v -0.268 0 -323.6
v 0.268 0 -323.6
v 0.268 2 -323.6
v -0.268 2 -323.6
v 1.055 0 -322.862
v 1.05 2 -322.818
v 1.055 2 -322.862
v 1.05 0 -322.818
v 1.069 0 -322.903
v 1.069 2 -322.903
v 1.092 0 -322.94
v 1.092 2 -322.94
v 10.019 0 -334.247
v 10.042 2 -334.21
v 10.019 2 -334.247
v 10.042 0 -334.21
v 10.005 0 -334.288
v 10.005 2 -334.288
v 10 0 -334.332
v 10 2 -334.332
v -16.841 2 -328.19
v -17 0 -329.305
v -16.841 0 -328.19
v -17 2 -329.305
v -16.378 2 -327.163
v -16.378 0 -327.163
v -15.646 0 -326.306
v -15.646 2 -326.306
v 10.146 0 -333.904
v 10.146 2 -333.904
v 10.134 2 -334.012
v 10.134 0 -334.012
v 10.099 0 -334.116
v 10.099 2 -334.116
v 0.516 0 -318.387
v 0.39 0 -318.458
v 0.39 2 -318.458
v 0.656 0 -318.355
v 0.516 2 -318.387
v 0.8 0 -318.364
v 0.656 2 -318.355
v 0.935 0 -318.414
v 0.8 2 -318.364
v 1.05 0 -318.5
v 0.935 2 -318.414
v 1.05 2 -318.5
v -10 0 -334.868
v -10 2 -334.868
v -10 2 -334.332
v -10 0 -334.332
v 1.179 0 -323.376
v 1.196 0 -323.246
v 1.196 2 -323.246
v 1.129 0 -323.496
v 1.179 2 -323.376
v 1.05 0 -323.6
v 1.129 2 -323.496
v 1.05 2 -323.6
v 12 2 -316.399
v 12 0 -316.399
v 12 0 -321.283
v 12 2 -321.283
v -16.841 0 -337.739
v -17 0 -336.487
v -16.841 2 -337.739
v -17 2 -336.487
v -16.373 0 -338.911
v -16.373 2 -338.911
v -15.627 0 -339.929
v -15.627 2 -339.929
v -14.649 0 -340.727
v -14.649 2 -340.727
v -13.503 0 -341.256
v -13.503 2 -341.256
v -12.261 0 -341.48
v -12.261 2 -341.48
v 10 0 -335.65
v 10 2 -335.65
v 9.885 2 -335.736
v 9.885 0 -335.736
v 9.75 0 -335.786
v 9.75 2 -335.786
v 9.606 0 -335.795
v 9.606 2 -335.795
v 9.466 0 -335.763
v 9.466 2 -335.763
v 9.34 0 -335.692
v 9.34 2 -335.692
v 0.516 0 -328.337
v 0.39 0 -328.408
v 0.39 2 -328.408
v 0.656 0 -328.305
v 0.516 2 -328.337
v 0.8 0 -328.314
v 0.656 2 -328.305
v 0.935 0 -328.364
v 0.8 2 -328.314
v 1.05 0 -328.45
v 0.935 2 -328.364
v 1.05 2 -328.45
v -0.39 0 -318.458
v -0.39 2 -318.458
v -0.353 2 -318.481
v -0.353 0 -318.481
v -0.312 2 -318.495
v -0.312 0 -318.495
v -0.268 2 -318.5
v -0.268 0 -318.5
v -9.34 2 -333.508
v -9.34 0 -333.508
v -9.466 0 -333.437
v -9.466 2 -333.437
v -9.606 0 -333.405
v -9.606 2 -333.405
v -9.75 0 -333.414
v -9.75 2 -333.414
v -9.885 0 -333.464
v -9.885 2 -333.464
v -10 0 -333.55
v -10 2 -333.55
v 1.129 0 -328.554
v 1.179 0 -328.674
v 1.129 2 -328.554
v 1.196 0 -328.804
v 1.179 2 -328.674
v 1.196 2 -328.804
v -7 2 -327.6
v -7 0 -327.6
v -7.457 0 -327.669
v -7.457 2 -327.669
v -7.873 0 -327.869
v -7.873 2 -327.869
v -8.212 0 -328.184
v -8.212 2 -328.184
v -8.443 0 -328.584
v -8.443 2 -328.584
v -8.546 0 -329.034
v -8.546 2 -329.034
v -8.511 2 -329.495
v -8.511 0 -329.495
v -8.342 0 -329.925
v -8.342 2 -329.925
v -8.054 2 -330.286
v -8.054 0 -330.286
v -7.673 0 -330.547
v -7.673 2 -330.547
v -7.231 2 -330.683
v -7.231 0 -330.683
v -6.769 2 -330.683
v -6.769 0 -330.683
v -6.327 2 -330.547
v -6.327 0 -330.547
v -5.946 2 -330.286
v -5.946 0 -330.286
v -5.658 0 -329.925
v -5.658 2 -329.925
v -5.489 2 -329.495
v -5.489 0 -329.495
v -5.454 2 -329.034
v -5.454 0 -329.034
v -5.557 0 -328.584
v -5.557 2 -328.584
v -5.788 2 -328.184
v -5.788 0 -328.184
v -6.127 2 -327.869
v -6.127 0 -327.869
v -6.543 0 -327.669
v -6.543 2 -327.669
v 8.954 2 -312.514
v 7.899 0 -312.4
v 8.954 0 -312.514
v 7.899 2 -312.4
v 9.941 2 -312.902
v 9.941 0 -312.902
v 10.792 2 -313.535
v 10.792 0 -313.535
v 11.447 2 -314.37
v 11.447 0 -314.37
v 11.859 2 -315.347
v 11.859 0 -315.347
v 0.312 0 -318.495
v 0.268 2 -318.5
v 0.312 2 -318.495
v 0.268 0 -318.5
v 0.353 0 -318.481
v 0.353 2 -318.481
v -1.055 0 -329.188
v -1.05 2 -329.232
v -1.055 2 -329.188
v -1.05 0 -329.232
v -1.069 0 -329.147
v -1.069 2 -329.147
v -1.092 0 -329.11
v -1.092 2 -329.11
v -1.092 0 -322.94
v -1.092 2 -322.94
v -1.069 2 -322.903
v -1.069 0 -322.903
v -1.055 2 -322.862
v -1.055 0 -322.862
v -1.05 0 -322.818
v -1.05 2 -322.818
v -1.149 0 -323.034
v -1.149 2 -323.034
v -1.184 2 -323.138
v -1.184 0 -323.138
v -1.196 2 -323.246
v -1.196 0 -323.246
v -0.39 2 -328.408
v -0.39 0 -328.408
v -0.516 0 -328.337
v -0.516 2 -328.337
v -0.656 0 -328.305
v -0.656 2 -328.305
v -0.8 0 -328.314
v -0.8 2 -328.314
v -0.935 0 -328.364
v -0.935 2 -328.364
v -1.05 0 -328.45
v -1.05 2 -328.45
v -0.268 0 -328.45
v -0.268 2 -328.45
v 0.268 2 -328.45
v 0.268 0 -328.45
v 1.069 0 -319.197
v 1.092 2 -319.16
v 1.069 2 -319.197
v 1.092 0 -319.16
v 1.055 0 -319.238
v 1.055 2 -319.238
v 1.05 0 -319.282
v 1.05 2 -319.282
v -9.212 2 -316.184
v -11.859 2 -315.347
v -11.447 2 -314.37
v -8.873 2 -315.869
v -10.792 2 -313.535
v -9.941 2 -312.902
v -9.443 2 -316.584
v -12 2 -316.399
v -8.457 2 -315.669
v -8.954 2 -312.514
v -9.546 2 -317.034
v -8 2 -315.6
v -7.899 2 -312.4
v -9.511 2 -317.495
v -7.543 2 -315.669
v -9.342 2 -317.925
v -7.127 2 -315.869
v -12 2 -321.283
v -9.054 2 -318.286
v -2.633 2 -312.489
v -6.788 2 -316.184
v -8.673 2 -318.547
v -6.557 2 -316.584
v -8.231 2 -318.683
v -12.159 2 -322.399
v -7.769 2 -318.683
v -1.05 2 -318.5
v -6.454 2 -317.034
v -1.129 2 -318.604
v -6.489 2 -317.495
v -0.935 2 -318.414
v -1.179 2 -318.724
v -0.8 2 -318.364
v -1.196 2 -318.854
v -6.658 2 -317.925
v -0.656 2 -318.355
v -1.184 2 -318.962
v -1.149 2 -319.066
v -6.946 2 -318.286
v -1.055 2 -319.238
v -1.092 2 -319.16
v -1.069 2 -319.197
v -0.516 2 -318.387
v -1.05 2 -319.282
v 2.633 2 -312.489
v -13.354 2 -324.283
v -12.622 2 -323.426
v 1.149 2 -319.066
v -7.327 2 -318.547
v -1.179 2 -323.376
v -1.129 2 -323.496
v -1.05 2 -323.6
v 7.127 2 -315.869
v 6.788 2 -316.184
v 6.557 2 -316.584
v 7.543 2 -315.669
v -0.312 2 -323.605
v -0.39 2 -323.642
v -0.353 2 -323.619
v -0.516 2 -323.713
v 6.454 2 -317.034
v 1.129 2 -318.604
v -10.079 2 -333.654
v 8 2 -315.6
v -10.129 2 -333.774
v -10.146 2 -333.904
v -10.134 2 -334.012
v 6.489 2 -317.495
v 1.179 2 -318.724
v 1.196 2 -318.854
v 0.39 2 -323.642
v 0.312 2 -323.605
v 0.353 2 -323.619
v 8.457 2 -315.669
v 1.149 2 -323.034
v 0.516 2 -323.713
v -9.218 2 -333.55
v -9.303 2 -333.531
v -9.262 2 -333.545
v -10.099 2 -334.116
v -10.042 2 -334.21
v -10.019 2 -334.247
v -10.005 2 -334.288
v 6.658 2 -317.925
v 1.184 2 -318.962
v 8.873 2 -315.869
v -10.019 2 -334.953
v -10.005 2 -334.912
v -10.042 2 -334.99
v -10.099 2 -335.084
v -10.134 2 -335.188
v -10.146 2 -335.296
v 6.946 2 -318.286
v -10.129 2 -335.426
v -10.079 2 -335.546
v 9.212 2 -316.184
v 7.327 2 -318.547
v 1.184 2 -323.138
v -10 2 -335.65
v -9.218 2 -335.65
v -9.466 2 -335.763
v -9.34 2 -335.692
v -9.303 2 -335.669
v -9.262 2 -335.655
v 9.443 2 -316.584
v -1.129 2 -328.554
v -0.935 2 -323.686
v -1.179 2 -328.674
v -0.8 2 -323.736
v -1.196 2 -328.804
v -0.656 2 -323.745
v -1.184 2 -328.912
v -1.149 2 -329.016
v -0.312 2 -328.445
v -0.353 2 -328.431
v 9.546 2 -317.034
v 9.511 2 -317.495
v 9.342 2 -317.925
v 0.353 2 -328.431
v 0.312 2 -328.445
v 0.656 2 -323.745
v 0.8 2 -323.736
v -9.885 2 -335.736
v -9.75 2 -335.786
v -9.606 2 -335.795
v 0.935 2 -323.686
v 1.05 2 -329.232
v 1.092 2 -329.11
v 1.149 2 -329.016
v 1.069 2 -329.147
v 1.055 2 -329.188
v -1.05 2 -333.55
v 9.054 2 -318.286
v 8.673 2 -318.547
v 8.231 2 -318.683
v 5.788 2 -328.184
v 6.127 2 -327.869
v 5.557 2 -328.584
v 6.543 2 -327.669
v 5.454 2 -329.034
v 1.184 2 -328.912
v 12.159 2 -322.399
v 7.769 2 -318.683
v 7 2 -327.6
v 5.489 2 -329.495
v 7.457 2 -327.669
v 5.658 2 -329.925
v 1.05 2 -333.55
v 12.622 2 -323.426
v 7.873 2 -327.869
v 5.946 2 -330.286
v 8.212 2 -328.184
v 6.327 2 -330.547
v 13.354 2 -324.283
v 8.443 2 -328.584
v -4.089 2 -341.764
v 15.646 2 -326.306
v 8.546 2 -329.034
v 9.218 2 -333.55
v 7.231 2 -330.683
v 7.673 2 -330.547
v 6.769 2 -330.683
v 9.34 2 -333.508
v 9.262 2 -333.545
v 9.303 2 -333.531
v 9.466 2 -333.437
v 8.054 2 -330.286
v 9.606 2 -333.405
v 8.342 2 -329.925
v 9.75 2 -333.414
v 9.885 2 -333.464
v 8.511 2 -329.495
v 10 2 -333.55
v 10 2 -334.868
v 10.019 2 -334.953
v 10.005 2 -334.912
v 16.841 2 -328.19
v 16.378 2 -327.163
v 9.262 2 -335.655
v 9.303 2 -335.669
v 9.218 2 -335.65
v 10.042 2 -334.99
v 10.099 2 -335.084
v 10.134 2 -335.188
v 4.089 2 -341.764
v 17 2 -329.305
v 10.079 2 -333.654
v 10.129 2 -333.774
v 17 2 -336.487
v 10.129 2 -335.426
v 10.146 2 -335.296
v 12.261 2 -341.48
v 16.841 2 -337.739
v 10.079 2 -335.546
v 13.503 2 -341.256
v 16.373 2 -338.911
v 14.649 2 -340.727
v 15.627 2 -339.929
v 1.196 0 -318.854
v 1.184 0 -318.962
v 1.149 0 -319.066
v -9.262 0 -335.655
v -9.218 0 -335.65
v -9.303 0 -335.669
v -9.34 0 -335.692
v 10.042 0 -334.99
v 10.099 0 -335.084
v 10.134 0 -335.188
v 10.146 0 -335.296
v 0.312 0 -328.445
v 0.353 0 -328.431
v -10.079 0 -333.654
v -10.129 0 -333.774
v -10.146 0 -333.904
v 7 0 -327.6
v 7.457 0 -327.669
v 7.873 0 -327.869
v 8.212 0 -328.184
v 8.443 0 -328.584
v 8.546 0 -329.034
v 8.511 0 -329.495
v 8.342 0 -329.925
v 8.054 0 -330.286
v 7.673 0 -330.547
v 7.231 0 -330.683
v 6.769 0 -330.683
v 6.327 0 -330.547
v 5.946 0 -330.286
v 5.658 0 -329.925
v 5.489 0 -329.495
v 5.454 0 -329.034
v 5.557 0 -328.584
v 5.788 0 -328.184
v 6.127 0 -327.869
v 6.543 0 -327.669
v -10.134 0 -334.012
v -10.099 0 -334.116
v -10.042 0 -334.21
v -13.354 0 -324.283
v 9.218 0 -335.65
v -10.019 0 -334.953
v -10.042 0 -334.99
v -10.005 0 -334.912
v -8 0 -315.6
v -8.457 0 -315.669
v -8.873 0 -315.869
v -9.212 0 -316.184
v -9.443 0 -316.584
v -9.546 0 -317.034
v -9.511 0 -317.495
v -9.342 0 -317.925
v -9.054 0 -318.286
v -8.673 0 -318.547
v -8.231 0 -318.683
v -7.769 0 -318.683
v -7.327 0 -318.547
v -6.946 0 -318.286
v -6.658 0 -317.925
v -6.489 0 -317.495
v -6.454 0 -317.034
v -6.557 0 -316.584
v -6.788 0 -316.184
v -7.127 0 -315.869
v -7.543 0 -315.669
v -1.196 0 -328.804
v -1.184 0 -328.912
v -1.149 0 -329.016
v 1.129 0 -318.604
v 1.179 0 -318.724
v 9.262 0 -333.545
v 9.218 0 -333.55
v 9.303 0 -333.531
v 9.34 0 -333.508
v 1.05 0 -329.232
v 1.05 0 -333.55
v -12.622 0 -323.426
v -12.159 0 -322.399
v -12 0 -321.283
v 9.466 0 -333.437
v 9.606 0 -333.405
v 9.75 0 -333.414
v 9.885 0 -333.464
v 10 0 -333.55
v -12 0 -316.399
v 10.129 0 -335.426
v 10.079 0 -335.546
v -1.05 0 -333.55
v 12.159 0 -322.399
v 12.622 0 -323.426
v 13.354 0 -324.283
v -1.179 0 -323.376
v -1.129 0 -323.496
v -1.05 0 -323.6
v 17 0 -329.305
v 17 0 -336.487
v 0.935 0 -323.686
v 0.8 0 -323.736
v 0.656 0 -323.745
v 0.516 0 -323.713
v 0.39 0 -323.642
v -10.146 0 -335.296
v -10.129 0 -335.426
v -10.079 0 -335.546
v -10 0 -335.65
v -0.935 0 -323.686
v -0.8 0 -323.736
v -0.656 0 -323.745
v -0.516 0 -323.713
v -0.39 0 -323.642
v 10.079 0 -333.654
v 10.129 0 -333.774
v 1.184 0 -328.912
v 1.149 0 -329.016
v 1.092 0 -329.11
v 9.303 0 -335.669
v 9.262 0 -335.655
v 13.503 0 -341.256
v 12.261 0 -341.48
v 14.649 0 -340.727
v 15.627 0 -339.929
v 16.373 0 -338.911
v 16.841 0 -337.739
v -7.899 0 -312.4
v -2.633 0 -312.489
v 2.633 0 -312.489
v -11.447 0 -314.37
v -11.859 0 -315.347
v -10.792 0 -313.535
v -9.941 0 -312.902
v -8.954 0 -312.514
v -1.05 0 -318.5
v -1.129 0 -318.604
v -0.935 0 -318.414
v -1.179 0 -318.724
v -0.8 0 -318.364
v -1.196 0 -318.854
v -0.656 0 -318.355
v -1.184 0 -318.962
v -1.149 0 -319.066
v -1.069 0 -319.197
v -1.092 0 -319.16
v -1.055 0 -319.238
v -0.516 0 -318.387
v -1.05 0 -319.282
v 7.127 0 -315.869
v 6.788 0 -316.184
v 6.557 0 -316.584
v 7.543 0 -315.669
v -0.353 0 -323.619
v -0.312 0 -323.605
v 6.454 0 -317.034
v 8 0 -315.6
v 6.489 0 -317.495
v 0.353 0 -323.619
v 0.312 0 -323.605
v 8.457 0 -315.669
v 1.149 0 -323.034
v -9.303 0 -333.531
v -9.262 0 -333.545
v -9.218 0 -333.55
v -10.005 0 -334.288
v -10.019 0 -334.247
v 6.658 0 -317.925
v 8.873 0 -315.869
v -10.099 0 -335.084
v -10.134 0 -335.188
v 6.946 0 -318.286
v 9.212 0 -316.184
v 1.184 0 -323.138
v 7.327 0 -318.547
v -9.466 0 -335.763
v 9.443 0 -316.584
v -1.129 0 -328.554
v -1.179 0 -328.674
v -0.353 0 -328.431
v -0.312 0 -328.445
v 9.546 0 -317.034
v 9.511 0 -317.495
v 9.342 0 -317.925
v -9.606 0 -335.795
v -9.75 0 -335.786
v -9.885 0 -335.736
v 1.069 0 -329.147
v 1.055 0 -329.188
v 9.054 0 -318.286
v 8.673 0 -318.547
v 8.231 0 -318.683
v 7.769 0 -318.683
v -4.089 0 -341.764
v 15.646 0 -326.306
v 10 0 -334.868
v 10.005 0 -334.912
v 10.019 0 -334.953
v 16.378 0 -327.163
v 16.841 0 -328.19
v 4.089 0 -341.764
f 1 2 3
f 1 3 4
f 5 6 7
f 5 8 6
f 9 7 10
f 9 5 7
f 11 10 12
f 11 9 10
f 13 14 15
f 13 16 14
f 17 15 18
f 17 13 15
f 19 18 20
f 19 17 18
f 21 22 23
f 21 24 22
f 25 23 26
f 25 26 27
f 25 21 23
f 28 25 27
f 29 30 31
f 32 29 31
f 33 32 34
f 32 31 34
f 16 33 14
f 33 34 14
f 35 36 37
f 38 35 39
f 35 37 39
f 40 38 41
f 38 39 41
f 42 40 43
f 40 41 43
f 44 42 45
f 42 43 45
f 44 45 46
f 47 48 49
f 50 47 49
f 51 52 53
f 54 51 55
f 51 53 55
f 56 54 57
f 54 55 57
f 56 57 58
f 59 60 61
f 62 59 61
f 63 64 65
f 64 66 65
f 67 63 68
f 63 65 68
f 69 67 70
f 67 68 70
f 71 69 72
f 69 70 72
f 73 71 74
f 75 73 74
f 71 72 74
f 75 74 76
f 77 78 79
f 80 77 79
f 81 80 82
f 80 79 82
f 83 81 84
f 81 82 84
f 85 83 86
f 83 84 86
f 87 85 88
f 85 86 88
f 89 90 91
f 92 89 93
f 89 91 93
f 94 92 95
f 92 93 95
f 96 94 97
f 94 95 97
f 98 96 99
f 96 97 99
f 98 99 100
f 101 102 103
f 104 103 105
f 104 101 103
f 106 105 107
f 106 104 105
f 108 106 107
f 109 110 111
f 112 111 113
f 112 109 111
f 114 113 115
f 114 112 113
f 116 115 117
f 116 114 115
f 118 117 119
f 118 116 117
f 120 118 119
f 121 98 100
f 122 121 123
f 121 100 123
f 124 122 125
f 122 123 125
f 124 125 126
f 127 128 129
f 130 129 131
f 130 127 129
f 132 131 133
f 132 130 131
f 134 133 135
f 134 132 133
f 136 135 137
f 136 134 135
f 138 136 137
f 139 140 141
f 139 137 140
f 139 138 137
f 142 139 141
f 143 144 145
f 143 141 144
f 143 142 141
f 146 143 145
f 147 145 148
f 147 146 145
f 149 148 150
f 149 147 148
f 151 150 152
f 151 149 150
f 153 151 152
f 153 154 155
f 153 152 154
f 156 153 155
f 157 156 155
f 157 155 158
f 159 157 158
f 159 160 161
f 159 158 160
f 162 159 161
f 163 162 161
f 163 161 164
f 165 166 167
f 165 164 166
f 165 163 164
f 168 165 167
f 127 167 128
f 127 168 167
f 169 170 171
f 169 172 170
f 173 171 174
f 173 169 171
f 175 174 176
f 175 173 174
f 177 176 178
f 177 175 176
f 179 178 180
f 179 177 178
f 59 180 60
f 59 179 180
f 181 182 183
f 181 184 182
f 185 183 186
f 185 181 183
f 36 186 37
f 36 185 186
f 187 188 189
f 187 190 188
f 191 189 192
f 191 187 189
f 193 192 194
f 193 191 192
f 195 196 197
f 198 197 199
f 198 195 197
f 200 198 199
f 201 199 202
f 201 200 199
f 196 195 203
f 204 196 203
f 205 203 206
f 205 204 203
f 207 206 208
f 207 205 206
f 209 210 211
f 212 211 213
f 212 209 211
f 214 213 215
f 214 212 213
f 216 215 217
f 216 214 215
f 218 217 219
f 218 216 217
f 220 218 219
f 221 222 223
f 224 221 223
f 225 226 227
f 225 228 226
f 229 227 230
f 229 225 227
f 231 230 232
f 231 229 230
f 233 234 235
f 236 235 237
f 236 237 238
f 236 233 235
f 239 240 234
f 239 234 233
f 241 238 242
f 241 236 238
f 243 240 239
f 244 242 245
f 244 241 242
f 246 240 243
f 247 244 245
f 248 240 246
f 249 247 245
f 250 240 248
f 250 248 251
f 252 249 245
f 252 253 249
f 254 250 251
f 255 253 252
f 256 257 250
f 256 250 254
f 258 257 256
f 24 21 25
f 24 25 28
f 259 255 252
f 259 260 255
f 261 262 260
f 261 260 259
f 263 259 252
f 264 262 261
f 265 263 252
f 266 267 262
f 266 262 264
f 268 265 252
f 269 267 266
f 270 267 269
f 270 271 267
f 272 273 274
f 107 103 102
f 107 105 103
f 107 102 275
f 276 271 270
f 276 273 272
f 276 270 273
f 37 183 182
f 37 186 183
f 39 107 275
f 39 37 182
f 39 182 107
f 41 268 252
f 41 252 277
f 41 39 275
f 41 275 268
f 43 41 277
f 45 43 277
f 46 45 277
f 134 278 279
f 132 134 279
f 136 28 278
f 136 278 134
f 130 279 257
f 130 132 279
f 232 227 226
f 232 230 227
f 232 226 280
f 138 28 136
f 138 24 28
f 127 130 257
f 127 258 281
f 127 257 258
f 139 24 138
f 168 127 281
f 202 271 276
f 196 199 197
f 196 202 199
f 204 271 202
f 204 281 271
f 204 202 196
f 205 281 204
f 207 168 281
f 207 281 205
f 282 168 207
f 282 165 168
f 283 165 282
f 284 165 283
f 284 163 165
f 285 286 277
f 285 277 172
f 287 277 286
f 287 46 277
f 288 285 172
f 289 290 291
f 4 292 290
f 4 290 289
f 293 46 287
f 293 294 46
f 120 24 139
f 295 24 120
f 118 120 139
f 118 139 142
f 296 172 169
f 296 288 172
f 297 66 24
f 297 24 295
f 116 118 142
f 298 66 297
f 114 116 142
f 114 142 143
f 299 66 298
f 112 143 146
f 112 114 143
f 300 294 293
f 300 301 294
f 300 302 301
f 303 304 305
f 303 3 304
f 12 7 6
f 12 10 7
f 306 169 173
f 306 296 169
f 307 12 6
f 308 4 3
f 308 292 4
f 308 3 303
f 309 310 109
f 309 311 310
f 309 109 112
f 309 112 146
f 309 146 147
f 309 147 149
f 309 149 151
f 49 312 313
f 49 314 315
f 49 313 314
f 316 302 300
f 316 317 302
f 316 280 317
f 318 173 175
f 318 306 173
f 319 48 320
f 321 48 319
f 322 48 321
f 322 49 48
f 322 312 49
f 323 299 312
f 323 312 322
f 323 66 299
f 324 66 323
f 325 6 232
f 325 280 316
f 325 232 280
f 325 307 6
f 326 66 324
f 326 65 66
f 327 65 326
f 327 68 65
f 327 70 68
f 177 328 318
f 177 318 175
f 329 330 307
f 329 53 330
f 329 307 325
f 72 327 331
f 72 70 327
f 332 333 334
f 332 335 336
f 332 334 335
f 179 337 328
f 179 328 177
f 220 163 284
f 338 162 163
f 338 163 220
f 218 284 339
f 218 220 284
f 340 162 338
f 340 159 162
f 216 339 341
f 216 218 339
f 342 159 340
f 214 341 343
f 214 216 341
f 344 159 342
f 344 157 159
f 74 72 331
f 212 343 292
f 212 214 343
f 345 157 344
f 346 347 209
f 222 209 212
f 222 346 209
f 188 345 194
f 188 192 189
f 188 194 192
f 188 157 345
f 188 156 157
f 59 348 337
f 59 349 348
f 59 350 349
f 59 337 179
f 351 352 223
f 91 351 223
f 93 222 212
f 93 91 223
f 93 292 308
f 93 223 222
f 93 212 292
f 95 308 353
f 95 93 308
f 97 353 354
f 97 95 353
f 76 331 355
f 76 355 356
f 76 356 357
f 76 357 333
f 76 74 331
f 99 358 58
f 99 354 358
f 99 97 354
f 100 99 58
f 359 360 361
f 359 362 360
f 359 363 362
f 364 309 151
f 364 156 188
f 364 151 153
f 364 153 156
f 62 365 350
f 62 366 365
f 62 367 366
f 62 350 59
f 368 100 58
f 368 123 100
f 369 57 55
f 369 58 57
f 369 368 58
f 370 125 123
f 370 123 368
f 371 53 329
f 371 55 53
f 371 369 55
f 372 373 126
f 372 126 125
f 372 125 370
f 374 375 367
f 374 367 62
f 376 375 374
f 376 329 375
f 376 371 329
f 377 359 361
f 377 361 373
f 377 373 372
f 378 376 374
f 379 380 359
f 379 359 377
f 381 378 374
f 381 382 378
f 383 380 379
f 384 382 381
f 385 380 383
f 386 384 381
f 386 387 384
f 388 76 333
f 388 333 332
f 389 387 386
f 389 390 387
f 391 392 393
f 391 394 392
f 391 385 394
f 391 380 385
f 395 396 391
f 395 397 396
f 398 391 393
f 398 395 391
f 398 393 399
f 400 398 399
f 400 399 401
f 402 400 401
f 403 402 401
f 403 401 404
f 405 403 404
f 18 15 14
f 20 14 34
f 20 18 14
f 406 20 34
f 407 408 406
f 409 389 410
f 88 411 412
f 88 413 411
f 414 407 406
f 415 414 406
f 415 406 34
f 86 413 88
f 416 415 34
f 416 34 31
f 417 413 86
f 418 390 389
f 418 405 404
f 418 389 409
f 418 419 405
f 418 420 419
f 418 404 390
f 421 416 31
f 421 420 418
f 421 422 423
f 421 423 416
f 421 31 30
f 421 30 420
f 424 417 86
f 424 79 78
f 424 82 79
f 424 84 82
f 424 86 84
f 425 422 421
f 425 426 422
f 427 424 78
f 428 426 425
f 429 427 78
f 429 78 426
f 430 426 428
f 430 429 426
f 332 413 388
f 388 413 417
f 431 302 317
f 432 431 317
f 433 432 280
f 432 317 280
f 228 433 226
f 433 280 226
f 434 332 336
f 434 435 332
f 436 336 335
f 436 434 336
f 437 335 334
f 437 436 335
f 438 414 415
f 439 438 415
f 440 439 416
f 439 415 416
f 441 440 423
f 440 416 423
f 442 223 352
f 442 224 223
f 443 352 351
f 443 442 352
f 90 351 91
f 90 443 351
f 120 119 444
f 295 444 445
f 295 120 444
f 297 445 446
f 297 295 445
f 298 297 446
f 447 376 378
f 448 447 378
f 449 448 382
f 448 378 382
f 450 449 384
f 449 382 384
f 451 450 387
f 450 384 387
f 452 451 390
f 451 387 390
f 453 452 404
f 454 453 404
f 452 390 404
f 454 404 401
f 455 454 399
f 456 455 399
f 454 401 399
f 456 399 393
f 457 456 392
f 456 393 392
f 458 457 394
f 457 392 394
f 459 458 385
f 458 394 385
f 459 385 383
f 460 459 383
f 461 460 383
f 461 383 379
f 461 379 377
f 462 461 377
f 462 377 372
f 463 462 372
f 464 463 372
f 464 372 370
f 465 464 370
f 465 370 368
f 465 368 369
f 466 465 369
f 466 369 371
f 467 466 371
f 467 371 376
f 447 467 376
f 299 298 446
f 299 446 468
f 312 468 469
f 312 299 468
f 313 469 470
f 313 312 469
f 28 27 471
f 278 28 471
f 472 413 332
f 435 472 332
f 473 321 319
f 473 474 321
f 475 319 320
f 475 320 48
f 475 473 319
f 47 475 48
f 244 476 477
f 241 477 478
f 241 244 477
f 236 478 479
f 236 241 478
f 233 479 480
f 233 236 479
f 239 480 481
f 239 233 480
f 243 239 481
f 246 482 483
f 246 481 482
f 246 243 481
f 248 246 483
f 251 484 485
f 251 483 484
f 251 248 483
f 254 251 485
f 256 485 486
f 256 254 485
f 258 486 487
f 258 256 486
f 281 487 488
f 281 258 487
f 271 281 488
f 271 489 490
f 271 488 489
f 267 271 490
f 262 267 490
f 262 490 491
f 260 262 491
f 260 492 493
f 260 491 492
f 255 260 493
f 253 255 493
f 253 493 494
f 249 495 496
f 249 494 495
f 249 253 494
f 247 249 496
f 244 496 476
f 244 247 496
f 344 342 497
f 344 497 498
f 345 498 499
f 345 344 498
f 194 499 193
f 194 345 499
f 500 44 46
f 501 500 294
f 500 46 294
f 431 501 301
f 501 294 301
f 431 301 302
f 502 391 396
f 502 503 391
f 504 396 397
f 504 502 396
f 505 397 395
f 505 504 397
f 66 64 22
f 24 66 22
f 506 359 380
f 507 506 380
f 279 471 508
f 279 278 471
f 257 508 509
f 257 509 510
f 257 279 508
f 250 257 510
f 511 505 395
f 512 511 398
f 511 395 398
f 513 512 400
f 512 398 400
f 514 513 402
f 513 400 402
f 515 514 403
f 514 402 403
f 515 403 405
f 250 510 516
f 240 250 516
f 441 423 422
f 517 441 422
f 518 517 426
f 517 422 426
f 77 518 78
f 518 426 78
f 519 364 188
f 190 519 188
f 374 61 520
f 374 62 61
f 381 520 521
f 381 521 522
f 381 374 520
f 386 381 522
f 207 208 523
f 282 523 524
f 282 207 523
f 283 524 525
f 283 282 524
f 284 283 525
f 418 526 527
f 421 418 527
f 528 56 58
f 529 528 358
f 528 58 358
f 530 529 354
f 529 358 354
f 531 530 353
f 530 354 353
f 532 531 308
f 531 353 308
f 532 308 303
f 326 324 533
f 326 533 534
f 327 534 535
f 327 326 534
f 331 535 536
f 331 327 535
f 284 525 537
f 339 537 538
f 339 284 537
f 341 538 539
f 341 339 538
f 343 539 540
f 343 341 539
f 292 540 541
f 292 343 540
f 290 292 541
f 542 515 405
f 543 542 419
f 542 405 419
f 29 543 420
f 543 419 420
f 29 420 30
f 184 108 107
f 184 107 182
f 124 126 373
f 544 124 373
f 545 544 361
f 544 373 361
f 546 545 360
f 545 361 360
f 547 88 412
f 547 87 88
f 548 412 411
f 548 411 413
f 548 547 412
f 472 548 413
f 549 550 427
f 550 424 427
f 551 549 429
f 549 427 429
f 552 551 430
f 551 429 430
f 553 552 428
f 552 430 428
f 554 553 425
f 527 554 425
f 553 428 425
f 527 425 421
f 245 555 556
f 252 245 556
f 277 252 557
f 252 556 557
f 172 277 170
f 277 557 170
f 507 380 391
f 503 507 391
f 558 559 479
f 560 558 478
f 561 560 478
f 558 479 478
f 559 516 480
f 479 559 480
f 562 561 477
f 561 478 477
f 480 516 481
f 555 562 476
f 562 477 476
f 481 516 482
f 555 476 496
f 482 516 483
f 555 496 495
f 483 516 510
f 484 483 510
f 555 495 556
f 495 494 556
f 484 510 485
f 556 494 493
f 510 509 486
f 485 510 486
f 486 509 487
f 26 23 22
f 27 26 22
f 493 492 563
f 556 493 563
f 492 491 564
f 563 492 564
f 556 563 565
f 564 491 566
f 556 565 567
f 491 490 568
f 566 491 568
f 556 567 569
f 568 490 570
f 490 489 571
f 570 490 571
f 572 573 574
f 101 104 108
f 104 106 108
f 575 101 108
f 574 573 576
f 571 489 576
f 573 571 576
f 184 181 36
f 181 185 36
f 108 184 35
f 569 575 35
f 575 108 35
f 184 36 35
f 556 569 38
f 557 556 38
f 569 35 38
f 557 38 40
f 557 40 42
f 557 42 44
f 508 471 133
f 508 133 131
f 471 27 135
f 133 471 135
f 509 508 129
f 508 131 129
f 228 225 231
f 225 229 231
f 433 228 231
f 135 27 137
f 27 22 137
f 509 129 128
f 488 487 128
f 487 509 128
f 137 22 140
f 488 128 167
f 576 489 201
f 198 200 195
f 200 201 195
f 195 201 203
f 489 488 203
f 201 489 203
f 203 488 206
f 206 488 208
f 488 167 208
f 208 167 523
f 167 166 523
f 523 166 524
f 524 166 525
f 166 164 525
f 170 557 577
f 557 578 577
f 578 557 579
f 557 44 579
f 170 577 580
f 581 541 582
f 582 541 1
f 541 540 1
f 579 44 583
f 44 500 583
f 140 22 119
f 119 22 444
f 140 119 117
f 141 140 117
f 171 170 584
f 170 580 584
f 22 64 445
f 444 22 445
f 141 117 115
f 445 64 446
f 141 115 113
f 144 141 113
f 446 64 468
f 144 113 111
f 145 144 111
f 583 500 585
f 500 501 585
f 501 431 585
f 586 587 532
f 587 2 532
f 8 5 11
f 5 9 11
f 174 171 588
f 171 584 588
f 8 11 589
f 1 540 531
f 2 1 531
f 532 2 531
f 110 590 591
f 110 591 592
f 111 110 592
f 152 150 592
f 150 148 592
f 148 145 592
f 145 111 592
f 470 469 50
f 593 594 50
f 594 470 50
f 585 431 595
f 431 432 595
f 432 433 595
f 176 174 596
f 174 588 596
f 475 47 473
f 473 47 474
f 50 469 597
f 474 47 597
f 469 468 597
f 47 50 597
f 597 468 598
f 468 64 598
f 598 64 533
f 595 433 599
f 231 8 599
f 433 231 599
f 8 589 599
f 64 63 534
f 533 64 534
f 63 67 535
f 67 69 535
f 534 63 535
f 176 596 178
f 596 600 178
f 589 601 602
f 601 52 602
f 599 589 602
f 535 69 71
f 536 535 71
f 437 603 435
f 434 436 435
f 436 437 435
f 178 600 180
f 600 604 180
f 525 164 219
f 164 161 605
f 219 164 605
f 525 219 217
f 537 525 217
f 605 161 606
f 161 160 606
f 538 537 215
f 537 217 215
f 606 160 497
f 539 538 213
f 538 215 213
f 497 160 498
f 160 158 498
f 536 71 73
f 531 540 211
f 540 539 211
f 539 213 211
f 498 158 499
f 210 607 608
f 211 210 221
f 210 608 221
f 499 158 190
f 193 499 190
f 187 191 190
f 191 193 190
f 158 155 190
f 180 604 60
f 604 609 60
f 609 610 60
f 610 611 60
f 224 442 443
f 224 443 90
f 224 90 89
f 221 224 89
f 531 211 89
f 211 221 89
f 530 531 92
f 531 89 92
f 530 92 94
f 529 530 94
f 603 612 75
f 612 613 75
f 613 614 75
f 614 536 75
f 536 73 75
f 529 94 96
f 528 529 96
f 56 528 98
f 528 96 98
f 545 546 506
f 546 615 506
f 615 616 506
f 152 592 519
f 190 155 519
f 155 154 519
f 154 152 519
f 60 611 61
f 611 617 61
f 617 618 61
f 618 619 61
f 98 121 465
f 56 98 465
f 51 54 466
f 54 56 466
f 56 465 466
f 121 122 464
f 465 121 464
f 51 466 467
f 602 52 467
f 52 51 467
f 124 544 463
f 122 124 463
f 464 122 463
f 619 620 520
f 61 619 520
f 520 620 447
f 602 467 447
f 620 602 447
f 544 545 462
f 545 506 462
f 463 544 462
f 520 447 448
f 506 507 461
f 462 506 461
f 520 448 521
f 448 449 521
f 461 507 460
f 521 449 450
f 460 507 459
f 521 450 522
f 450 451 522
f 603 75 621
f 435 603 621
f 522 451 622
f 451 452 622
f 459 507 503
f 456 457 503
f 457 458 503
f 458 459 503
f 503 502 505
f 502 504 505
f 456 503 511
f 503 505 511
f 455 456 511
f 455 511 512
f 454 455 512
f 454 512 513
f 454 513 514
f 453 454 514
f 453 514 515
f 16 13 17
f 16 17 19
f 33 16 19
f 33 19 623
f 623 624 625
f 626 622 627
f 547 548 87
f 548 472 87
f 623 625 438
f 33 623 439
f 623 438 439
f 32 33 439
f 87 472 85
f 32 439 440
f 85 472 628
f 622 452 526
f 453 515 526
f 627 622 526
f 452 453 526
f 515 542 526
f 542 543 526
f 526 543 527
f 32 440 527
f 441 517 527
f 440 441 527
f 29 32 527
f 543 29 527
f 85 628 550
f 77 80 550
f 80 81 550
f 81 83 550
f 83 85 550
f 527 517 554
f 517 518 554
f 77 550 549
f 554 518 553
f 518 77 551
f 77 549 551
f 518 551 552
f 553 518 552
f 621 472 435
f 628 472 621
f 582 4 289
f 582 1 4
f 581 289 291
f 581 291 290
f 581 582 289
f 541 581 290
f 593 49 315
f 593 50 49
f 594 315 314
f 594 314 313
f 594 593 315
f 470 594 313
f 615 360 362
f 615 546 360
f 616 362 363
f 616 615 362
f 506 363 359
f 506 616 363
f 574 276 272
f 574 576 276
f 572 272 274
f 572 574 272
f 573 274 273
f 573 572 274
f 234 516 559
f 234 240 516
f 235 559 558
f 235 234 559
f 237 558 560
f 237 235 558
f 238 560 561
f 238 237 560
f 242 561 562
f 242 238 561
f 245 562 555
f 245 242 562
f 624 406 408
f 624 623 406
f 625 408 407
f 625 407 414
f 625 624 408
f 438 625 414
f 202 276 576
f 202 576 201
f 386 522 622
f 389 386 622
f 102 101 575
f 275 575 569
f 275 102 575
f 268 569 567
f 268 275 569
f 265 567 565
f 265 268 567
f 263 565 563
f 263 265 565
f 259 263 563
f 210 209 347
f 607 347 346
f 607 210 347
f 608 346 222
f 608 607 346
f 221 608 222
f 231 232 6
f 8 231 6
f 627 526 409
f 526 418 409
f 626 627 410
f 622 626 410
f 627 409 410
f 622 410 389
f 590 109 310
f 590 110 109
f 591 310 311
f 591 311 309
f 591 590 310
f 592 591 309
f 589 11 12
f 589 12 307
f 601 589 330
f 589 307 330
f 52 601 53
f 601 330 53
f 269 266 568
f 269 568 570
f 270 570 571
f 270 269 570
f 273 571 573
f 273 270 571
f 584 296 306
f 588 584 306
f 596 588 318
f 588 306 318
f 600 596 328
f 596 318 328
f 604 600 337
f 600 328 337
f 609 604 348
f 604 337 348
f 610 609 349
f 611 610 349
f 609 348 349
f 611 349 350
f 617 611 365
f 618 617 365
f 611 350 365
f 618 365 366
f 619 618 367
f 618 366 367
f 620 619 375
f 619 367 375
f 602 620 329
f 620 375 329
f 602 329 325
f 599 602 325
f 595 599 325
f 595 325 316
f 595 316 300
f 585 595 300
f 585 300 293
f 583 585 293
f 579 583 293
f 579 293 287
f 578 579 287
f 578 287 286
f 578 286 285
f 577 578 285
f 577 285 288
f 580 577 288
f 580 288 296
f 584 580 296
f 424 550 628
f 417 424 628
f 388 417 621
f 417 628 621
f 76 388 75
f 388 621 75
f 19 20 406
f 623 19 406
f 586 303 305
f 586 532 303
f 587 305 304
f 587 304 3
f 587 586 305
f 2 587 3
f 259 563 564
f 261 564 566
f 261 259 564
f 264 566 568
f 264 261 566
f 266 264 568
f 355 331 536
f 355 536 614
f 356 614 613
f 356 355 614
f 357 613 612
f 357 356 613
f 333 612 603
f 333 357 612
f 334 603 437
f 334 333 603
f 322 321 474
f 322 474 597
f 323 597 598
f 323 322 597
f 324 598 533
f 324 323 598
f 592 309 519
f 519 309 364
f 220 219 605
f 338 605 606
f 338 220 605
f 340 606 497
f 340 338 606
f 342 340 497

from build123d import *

# Parameters (mm, degrees)
EXTRUDE_1_DEPTH     = 2
SKETCH_2_W          = 1.05
SKETCH_2_H          = 5.1
CUT_EXTRUDE_1_DEPTH = 343.228344823
CUT_EXTRUDE_2_DEPTH = 343.228344823
FILLET_1_R          = 0.2
SKETCH_4_R          = 1.55
CUT_EXTRUDE_3_DEPTH = 343.228344823
FILLET_2_R          = 5
FILLET_3_R          = 4


with BuildPart() as part:
    # 草图1 → 凸台-拉伸1 (new body)
    with BuildSketch(Plane(origin=(0, 0, 0), x_dir=(1, 0, 0), z_dir=(0, 1, 0))):
        with BuildLine():
            Line((-17, 327.5), (-12, 323.088235294))
            Line((-12, 323.088235294), (-12, 312.269515003))
            ThreePointArc((-12, 312.269515003), (0, 312.5), (12, 312.269515003))
            Line((12, 312.269515003), (12, 323.088235294))
            Line((12, 323.088235294), (17, 327.5))
            Line((17, 327.5), (17, 341.184299815))
            ThreePointArc((17, 341.184299815), (0, 341.8), (-17, 341.184299815))
            Line((-17, 341.184299815), (-17, 327.5))
        make_face()
    extrude(amount=EXTRUDE_1_DEPTH)

    # 草图2 → 切除-拉伸1 (cut, through all)
    with BuildSketch(Plane(origin=(0, 2, 0), x_dir=(1, 0, 0), z_dir=(0, 1, 0))):
        Polygon((0, 335.65), (0, 328.45), (1.05, 328.45), (1.05, 333.55), (10, 333.55), (10, 335.65), align=None)
        Polygon((-1.05, 328.45), (0, 328.45), (0, 335.65), (-10, 335.65), (-10, 333.55), (-1.05, 333.55), align=None)
        with Locations((0.525, 321.05)):
            Rectangle(SKETCH_2_W, SKETCH_2_H)
        with Locations((-0.525, 321.05)):
            Rectangle(SKETCH_2_W, SKETCH_2_H)
    extrude(amount=-CUT_EXTRUDE_1_DEPTH, mode=Mode.SUBTRACT)

    # 草图3 → 切除-拉伸2 (cut, through all)
    with BuildSketch(Plane(origin=(0, 2, 0), x_dir=(1, 0, 0), z_dir=(0, 1, 0))):
        with BuildLine():
            Line((10, 335.65), (10, 334.942893219))
            ThreePointArc((10, 334.942893219), (10.108386376, 335.105104893), (10.146446609, 335.296446609))
            ThreePointArc((10.146446609, 335.296446609), (10.108386376, 335.487788326), (10, 335.65))
        make_face()
        with BuildLine():
            ThreePointArc((10, 335.65), (9.646446609, 335.796446609), (9.292893219, 335.65))
            Line((9.292893219, 335.65), (10, 335.65))
        make_face()
        with BuildLine():
            ThreePointArc((10.146446609, 333.903553391), (10.108386376, 334.094895107), (10, 334.257106781))
            Line((10, 334.257106781), (10, 333.55))
            ThreePointArc((10, 333.55), (10.108386376, 333.712211674), (10.146446609, 333.903553391))
        make_face()
        with BuildLine():
            Line((10, 333.55), (9.292893219, 333.55))
            ThreePointArc((9.292893219, 333.55), (9.646446609, 333.403553391), (10, 333.55))
        make_face()
        with BuildLine():
            ThreePointArc((1.196446609, 328.803553391), (1.158386376, 328.994895107), (1.05, 329.157106781))
            Line((1.05, 329.157106781), (1.05, 328.45))
            ThreePointArc((1.05, 328.45), (1.158386376, 328.612211674), (1.196446609, 328.803553391))
        make_face()
        with BuildLine():
            Line((1.05, 328.45), (0.342893219, 328.45))
            ThreePointArc((0.342893219, 328.45), (0.696446609, 328.303553391), (1.05, 328.45))
        make_face()
        with BuildLine():
            ThreePointArc((1.196446609, 323.246446609), (1.158386376, 323.437788326), (1.05, 323.6))
            Line((1.05, 323.6), (1.05, 322.892893219))
            ThreePointArc((1.05, 322.892893219), (1.158386376, 323.055104893), (1.196446609, 323.246446609))
        make_face()
        with BuildLine():
            ThreePointArc((1.05, 323.6), (0.696446609, 323.746446609), (0.342893219, 323.6))
            Line((0.342893219, 323.6), (1.05, 323.6))
        make_face()
        with BuildLine():
            ThreePointArc((1.196446609, 318.853553391), (1.158386376, 319.044895107), (1.05, 319.207106781))
            Line((1.05, 319.207106781), (1.05, 318.5))
            ThreePointArc((1.05, 318.5), (1.158386376, 318.662211674), (1.196446609, 318.853553391))
        make_face()
        with BuildLine():
            Line((1.05, 318.5), (0.342893219, 318.5))
            ThreePointArc((0.342893219, 318.5), (0.696446609, 318.353553391), (1.05, 318.5))
        make_face()
    cut_extrude_2 = extrude(amount=-CUT_EXTRUDE_2_DEPTH, mode=Mode.SUBTRACT)

    # 镜向1: 切除-拉伸2 across plane
    add(cut_extrude_2.mirror(Plane(origin=(0, 0, 0), x_dir=(0, 0, 1), z_dir=(1, 0, 0))), mode=Mode.SUBTRACT)

    # 圆角1
    fillet_1_edges = [part.edges().sort_by_distance(p)[0] for p in [
        (1.05, 1, -329.157106781),
        (0.342893219, 1, -323.6),
        (1.05, 1, -319.207106781),
        (9.292893219, 1, -335.65),
        (10, 1, -334.257106781),
        (0.342893219, 1, -328.45),
        (1.05, 1, -322.892893219),
        (0.342893219, 1, -318.5),
        (-10, 1, -334.942893219),
        (-9.292893219, 1, -333.55),
        (-1.05, 1, -329.157106781),
        (-0.342893219, 1, -323.6),
        (-1.05, 1, -319.207106781),
        (-9.292893219, 1, -335.65),
        (-10, 1, -334.257106781),
        (-0.342893219, 1, -328.45),
        (-1.05, 1, -322.892893219),
        (-0.342893219, 1, -318.5),
        (10, 1, -334.942893219),
        (9.292893219, 1, -333.55),
    ]]
    fillet(fillet_1_edges, radius=FILLET_1_R)

    # 草图4 → 切除-拉伸3 (cut, through all)
    with BuildSketch(Plane(origin=(0, 2, 0), x_dir=(1, 0, 0), z_dir=(0, 1, 0))):
        with Locations(Location((7, 329.15, 0), (0, 0, 270))):
            Circle(SKETCH_4_R)
        with Locations(Location((8, 317.15, 0), (0, 0, 270))):
            Circle(SKETCH_4_R)
    cut_extrude_3 = extrude(amount=-CUT_EXTRUDE_3_DEPTH, mode=Mode.SUBTRACT)

    # 镜向2: 切除-拉伸3 across plane
    add(cut_extrude_3.mirror(Plane(origin=(0, 0, 0), x_dir=(0, 0, 1), z_dir=(1, 0, 0))), mode=Mode.SUBTRACT)

    # 圆角2
    fillet_2_edges = [part.edges().sort_by_distance(p)[0] for p in [
        (-17, 1, -341.184299815),
        (17, 1, -341.184299815),
    ]]
    fillet(fillet_2_edges, radius=FILLET_2_R)

    # 圆角3
    fillet_3_edges = [part.edges().sort_by_distance(p)[0] for p in [
        (17, 1, -327.5),
        (12, 1, -323.088235294),
        (12, 1, -312.269515003),
        (-12, 1, -312.269515003),
        (-12, 1, -323.088235294),
        (-17, 1, -327.5),
    ]]
    fillet(fillet_3_edges, radius=FILLET_3_R)


solid = part.part
